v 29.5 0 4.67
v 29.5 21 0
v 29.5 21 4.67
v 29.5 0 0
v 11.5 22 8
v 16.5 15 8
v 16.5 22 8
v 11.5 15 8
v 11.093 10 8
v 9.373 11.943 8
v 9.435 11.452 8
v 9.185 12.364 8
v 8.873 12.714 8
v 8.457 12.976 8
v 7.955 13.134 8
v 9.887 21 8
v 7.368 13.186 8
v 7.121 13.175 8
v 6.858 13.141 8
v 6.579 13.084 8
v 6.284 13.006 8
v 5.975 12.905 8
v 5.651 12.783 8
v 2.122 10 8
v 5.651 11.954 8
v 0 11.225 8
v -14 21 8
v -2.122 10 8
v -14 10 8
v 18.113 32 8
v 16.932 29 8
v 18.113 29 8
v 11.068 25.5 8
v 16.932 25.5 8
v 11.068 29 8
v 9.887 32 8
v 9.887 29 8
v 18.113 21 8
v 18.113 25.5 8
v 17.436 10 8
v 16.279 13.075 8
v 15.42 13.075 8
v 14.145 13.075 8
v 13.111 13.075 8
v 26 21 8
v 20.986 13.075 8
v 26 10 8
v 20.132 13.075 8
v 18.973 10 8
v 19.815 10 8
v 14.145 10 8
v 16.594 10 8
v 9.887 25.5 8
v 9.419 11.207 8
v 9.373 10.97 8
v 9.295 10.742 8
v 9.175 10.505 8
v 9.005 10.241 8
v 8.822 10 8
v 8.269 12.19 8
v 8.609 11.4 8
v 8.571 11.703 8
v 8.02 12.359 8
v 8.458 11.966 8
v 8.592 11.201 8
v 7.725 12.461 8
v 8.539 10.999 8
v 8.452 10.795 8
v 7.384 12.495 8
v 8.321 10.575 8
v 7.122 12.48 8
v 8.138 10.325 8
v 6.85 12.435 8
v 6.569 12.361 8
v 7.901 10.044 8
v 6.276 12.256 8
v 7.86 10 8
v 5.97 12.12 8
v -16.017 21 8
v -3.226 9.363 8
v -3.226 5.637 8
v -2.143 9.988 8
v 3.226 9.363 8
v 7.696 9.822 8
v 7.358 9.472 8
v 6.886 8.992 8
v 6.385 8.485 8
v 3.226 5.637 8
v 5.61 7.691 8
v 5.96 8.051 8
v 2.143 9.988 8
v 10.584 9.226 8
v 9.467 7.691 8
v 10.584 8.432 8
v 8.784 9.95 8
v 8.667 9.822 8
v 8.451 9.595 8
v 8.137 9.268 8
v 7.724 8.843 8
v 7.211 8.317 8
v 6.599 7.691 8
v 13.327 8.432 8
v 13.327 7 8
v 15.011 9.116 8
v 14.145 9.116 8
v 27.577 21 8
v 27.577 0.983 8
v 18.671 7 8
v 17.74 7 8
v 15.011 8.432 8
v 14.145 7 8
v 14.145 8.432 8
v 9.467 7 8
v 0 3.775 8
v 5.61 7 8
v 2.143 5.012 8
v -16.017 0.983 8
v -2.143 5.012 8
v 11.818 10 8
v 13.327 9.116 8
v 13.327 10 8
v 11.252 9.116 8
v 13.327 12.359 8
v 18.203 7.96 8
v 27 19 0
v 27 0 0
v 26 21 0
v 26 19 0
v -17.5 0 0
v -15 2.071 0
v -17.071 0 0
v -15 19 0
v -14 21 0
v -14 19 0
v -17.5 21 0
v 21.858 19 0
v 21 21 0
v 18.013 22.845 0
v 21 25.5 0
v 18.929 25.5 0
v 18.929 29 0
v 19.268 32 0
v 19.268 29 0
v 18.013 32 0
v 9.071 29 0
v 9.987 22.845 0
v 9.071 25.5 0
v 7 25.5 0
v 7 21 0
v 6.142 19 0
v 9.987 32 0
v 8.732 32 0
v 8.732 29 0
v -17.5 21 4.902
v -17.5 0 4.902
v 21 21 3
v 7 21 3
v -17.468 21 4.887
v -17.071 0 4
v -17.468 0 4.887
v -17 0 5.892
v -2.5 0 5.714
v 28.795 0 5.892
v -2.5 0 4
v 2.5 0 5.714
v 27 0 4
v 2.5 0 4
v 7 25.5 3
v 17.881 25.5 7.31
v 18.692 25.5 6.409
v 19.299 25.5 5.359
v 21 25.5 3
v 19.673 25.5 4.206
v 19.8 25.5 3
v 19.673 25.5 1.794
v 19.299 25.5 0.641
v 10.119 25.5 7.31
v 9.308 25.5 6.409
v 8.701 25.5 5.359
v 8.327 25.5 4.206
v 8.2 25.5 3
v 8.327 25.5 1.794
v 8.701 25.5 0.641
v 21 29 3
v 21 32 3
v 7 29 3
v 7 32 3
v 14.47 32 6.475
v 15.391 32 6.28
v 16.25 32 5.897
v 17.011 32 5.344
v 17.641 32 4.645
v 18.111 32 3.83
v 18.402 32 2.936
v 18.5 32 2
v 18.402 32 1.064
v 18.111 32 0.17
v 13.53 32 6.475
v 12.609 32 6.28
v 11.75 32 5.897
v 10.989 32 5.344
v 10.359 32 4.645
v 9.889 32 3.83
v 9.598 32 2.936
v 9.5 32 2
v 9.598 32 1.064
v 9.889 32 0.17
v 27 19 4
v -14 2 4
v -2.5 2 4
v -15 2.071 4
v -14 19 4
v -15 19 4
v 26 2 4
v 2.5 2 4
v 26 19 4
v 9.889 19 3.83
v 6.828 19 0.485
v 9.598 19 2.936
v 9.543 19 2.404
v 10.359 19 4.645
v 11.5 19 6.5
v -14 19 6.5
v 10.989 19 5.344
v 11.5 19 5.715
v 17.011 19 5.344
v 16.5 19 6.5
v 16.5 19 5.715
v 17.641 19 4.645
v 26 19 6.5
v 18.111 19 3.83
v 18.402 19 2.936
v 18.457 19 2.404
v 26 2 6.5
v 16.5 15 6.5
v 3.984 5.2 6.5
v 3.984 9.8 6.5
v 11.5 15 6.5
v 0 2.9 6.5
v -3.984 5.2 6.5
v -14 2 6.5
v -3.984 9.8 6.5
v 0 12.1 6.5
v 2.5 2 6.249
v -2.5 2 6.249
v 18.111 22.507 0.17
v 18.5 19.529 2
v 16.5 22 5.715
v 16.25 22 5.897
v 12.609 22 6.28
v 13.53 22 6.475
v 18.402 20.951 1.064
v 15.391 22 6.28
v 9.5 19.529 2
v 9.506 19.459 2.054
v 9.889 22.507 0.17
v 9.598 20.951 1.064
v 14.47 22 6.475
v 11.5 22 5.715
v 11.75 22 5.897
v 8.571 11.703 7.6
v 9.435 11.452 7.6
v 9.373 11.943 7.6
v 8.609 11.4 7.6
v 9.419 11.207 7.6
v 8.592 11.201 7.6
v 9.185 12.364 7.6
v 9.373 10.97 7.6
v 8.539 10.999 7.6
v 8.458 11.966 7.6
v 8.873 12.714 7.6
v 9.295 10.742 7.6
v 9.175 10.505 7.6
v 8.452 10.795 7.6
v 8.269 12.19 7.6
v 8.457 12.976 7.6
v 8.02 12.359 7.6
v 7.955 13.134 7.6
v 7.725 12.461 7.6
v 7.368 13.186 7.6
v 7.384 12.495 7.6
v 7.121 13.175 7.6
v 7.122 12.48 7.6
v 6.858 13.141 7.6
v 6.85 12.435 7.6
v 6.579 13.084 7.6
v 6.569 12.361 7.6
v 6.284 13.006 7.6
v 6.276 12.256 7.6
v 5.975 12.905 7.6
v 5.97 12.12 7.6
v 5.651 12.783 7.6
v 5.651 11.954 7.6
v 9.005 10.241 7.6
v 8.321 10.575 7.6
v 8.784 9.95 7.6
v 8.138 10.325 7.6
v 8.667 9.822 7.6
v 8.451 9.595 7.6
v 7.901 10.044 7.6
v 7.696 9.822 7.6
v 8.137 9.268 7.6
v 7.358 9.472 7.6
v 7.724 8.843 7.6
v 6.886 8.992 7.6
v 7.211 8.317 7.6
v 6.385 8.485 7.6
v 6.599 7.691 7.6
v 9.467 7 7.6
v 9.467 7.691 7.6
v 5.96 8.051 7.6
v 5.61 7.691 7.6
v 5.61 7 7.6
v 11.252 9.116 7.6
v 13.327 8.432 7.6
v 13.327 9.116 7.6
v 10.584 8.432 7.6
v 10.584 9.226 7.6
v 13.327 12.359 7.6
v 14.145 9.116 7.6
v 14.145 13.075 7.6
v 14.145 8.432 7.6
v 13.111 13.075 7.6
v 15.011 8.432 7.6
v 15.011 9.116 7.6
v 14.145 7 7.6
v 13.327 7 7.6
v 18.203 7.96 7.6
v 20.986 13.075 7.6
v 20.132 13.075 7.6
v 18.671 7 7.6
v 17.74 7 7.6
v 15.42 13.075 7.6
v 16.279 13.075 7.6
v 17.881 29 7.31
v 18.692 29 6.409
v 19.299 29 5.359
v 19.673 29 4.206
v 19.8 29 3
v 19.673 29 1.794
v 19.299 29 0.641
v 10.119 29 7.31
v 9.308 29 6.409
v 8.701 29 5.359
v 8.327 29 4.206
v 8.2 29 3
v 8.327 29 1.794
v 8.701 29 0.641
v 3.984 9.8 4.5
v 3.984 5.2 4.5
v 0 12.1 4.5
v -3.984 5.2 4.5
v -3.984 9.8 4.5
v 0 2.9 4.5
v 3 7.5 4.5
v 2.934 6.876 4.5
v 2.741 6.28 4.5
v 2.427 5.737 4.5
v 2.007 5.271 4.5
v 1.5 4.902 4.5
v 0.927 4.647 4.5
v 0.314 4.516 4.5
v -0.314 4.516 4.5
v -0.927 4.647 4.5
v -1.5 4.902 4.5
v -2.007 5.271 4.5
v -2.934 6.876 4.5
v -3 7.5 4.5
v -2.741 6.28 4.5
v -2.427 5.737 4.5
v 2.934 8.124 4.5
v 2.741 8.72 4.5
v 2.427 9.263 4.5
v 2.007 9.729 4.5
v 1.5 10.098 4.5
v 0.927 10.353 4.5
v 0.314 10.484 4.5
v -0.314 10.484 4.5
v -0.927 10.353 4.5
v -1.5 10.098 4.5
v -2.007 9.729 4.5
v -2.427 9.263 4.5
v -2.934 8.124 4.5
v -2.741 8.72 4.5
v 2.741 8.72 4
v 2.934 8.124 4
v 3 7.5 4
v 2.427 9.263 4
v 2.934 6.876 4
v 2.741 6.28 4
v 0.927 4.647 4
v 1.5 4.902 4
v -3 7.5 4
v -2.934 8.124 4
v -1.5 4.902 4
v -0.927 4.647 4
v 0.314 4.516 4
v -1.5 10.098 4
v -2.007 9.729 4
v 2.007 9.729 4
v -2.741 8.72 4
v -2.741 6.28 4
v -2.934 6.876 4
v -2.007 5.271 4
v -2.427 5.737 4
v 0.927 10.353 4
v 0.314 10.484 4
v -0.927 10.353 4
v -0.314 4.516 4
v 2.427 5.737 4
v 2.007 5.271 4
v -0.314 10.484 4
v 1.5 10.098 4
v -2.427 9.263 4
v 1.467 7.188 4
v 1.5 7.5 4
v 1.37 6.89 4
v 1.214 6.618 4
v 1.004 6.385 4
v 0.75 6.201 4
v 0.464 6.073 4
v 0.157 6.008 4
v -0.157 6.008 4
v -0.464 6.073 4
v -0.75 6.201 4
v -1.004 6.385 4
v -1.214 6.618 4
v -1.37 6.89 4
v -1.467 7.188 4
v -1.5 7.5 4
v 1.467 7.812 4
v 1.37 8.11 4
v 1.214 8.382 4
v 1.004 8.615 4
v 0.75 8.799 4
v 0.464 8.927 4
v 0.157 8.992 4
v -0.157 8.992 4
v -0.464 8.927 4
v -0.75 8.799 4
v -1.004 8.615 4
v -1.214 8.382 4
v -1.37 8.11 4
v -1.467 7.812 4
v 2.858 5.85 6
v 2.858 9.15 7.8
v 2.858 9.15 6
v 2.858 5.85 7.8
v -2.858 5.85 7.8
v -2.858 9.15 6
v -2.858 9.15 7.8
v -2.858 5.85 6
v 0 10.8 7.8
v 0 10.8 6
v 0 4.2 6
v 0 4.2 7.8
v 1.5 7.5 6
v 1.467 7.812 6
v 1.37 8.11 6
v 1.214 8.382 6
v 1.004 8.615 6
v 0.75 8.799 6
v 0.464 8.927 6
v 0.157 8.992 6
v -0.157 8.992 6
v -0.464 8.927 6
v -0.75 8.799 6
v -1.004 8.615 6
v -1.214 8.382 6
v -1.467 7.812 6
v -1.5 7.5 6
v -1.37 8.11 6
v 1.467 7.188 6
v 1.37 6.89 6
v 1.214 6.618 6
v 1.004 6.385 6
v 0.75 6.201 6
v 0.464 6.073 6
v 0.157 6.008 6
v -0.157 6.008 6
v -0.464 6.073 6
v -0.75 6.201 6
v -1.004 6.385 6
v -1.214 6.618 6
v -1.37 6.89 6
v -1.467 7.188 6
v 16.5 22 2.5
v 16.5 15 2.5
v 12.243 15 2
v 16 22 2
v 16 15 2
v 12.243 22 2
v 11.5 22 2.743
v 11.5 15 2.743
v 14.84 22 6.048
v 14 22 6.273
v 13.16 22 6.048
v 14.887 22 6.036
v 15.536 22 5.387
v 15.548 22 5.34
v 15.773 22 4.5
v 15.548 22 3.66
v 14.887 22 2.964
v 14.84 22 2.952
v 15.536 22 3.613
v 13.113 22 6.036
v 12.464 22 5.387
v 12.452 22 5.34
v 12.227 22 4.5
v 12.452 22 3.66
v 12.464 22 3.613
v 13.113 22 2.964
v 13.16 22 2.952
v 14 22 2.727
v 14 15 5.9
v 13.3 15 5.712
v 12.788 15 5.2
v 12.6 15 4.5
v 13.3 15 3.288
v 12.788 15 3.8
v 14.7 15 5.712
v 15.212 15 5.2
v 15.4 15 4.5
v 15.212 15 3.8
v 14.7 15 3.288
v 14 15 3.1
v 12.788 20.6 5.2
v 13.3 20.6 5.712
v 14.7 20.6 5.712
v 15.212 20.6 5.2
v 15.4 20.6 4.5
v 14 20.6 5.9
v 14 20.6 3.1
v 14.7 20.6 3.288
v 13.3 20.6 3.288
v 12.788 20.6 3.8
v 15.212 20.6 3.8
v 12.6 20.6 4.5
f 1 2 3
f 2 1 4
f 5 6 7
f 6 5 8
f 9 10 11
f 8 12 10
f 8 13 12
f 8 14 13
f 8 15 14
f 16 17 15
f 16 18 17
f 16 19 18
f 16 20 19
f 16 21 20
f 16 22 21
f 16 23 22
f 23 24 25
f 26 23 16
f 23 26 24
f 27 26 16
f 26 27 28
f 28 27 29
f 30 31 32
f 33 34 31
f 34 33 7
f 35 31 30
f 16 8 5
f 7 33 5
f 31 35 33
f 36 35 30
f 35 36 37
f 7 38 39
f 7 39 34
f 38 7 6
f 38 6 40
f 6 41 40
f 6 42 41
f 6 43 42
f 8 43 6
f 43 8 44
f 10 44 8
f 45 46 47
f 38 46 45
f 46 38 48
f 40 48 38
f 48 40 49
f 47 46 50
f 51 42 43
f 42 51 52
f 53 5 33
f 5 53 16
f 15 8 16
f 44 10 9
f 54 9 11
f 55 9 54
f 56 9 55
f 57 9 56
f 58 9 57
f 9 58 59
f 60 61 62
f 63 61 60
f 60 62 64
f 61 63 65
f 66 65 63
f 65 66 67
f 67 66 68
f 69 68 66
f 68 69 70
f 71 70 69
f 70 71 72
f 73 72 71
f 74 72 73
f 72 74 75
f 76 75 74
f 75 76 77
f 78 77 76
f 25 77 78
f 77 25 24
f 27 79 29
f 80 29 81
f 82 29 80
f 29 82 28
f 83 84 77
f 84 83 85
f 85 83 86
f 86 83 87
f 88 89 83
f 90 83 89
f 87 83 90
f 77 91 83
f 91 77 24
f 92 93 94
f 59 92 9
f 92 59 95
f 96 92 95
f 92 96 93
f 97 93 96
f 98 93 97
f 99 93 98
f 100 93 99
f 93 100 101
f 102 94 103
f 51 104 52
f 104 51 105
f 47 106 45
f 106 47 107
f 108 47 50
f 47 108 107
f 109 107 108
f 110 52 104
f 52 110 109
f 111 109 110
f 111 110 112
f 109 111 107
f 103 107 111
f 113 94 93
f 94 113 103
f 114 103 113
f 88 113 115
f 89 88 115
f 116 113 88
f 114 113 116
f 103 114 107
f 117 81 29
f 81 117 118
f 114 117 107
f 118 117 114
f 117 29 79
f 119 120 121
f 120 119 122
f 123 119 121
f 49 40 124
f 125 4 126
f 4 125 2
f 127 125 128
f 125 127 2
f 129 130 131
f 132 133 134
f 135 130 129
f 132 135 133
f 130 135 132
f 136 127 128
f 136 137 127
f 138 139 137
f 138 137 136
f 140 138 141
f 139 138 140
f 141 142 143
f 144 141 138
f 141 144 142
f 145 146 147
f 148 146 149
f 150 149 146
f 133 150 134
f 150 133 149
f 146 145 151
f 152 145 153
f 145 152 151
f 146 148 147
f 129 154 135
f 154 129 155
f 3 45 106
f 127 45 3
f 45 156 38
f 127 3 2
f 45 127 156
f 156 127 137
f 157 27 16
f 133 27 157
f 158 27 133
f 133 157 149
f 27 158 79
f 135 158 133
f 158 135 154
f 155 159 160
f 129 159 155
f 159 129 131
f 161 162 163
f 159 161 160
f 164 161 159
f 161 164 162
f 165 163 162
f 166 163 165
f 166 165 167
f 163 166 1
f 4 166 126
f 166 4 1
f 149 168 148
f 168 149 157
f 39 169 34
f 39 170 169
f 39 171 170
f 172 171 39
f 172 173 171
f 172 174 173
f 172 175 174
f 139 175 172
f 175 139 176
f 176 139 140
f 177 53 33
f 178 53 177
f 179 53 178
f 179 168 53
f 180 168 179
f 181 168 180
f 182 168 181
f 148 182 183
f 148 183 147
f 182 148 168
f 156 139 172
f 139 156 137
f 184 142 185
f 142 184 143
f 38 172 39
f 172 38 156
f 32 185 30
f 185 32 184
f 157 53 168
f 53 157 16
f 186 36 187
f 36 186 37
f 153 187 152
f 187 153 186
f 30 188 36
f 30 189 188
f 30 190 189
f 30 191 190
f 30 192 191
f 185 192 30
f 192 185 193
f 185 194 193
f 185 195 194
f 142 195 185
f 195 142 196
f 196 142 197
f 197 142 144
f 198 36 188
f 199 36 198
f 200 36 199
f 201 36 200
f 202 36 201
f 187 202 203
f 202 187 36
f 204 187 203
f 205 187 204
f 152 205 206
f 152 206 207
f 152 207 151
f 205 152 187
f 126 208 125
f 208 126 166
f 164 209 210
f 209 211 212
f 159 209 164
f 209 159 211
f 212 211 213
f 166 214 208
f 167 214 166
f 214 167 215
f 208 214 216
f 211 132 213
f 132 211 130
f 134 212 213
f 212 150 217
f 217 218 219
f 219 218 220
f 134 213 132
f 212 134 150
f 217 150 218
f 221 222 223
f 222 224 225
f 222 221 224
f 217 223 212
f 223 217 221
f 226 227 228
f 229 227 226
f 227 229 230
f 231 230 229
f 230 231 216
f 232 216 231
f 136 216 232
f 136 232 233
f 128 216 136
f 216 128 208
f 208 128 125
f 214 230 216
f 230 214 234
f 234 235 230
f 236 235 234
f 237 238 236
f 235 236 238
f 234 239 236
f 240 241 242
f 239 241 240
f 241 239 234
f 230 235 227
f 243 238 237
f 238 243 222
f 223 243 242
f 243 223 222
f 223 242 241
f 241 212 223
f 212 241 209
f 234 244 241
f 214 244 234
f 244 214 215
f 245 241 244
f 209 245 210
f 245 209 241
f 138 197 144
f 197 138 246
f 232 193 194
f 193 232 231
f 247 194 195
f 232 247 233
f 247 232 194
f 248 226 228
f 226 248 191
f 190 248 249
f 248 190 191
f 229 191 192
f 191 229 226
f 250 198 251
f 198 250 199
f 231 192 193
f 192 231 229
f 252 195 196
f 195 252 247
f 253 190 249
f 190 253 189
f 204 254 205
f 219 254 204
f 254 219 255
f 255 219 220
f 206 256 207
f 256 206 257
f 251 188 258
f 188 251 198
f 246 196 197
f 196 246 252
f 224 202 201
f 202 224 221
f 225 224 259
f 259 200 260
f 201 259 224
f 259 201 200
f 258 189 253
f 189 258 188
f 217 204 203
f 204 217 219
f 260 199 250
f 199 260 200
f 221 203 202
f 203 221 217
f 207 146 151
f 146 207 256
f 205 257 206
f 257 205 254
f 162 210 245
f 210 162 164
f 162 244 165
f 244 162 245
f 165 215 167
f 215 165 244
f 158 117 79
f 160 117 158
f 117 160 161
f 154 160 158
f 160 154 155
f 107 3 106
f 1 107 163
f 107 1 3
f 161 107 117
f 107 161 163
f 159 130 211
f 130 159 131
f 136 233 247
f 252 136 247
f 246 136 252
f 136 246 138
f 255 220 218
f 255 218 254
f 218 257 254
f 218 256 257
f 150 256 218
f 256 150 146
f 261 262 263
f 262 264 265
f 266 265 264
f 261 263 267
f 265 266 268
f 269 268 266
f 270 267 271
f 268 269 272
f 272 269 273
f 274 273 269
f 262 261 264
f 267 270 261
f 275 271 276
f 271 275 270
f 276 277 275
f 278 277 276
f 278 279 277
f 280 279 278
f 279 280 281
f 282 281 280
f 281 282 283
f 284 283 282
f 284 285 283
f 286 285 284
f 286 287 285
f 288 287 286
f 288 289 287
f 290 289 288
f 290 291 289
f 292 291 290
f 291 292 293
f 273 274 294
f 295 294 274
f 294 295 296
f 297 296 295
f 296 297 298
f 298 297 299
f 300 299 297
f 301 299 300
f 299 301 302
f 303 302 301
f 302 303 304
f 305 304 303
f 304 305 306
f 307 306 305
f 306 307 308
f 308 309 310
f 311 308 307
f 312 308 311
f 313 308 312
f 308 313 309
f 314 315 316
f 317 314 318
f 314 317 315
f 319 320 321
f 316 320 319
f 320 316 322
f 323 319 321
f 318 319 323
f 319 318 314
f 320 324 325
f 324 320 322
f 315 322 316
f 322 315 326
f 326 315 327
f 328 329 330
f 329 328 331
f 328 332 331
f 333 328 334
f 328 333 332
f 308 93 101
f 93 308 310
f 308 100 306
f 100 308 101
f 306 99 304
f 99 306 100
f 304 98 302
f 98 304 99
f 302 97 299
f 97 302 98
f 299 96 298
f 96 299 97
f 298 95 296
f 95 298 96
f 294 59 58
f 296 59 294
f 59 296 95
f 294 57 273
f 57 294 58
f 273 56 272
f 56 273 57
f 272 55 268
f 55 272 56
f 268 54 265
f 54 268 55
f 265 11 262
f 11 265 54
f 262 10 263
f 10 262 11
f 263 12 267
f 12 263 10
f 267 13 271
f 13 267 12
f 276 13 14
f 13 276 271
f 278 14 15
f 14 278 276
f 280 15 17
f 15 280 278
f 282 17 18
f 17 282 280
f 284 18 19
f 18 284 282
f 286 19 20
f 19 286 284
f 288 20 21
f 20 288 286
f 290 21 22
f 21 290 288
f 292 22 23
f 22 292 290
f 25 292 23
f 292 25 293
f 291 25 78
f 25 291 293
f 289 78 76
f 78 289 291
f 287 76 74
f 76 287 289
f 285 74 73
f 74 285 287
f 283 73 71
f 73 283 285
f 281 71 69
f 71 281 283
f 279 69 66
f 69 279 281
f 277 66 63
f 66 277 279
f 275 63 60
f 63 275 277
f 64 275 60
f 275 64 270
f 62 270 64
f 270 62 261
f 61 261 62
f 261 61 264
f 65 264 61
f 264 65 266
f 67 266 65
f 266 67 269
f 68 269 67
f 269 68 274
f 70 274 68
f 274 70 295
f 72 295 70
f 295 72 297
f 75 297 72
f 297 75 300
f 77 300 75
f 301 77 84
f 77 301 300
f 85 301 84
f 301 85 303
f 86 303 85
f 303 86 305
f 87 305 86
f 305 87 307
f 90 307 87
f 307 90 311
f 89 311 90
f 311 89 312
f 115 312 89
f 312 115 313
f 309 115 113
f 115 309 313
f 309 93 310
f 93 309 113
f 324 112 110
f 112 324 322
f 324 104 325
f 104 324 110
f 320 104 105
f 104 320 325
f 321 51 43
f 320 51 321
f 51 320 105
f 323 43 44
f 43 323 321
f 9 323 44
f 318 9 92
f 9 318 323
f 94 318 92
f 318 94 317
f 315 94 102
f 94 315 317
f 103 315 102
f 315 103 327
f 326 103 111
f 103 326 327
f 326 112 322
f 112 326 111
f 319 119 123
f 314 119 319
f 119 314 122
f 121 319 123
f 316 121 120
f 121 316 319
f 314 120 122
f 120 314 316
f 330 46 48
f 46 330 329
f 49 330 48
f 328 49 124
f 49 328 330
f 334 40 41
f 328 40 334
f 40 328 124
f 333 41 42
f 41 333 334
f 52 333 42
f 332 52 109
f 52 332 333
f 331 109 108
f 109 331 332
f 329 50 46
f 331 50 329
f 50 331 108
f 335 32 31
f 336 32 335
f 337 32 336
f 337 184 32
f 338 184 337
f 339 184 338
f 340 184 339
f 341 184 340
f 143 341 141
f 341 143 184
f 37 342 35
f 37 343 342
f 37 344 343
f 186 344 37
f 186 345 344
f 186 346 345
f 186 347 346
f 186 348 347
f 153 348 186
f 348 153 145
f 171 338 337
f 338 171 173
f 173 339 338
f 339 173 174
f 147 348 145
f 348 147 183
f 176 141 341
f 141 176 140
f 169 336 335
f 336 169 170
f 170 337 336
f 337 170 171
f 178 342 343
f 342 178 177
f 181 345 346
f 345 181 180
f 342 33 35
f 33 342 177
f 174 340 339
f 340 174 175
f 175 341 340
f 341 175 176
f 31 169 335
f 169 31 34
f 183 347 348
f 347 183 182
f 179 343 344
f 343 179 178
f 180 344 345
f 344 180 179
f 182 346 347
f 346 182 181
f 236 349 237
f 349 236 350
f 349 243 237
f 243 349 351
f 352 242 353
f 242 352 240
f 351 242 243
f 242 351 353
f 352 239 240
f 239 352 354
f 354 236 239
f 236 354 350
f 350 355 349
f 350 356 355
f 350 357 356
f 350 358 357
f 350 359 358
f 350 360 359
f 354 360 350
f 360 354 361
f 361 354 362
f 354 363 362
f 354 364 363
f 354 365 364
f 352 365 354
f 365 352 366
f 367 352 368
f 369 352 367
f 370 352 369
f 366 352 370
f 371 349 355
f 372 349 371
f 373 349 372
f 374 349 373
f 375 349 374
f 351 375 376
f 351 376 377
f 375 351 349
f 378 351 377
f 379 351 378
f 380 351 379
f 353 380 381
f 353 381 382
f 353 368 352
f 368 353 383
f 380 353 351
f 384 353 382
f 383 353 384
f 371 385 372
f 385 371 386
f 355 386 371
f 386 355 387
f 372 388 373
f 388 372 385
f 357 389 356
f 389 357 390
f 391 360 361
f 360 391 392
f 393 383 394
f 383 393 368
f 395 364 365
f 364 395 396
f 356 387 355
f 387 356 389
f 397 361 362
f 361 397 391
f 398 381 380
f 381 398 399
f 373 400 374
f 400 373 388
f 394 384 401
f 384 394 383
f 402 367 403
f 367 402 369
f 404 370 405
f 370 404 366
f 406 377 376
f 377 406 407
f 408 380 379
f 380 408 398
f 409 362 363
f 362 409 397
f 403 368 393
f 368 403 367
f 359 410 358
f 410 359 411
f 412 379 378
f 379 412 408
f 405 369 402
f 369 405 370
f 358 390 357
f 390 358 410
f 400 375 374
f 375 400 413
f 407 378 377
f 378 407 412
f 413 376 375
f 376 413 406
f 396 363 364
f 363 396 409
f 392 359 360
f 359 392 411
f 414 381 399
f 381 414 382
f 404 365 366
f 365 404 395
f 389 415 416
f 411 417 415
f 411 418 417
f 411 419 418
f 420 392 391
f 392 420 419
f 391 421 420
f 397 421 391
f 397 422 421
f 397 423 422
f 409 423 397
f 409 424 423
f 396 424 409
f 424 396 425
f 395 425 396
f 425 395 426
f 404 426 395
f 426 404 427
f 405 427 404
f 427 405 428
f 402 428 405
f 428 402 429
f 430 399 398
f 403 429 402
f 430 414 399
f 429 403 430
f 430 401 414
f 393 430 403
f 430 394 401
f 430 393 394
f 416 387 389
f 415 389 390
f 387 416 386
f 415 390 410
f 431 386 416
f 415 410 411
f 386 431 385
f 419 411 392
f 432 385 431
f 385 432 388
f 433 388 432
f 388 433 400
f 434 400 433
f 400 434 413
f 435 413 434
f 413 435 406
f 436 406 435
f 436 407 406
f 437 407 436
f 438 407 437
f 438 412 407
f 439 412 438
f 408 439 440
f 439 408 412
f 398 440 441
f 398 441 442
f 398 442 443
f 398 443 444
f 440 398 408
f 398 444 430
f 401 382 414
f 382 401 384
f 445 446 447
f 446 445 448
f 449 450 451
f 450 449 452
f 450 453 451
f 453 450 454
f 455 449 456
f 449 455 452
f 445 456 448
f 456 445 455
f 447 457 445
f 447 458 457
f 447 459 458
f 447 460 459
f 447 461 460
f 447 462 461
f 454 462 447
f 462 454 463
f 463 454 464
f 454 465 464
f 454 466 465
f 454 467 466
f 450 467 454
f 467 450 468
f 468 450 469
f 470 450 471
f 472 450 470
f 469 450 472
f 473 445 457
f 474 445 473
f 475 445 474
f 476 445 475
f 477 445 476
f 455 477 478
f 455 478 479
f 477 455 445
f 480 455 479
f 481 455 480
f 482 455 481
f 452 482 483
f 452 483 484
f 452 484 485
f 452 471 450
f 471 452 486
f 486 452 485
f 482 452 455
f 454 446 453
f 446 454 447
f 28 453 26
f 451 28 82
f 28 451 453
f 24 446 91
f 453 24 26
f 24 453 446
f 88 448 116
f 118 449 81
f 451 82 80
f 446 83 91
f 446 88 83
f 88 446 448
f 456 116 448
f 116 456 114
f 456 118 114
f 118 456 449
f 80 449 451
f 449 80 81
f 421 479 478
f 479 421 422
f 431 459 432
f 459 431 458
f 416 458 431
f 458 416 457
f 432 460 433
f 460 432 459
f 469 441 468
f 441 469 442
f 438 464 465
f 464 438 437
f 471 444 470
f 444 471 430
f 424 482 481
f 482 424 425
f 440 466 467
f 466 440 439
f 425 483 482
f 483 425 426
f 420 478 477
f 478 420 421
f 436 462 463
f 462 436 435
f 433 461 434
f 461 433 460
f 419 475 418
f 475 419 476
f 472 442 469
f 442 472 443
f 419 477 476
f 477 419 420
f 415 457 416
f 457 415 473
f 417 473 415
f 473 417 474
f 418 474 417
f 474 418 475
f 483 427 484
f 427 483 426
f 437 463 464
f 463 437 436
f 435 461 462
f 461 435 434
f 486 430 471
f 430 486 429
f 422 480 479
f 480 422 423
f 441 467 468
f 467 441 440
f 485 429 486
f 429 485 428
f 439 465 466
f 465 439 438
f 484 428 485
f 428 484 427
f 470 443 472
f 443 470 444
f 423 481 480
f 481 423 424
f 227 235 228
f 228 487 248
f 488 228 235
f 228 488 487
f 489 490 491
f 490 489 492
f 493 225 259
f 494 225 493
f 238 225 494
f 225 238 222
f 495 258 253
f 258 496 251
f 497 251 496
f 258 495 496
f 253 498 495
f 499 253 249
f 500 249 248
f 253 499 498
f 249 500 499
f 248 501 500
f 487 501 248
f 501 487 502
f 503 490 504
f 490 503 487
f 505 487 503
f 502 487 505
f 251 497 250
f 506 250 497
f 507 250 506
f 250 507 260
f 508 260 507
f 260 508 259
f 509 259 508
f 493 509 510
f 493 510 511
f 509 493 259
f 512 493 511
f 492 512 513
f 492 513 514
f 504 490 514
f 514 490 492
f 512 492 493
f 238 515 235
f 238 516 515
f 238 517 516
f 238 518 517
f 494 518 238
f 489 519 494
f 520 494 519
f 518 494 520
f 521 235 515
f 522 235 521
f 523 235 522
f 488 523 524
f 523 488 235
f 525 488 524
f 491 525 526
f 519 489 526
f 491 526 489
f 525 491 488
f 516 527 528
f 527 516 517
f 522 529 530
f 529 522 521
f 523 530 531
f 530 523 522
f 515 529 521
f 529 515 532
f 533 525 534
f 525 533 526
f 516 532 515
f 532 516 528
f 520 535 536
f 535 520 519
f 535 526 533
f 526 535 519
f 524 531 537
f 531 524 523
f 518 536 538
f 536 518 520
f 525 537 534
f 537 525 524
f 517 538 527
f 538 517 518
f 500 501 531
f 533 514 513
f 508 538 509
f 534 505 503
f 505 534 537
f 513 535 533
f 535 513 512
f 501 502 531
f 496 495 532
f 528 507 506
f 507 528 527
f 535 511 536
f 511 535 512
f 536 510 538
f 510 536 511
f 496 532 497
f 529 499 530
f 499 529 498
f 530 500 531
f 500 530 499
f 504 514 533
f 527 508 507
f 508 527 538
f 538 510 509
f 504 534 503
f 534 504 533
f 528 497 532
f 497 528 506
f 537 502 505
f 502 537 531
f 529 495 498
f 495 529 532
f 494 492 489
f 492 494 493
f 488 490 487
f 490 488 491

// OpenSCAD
module cover()
{
    translate([ -17.5, 0, 0 ]) cube([ 47, 21, 8 ]);  // cover
    translate([ -7+14, 19, 0 ]) cube([ 3, 6.5, 3 ]);  // tube reinforcement
    translate([ 4+14, 19, 0 ]) cube([ 3, 6.5, 3 ]);  // tube reinforcement
    translate( [ 14 , 32 , 3 ] ) rotate( [90,0,0] ) cylinder( h = 12, r = 7, $fn=6);  // cable tube outer
}

module inside_cut(){
    translate([ -15, -1, -1 ]) cube( [42,20,5] );     // inside cut
    translate([ -14, 2, 4 ])  cube( [40,17,2.5 ] );     // inside cut
    
    translate( [ 14 , 32 , 2 ] ) rotate( [90,0,0] ) cylinder( h = 16, r = 4.5, $fn=30);  // cable tube inner
    
    translate([ -14, 10, -5 ])  cube( [40,25,5 ] );     // inside cut
    translate([ -14, 10, 8 ])  cube( [40,25,3 ] );     // inside cut
    
    translate([ -2.5, -6, 1 ])  rotate([15,0,0]) cube( [5,10,3 ] );     // LED
    
    translate([ -22, -5, 7 ]) rotate([0,25,0])  cube( [5,40,6 ] );     // corners
    translate([ 27, -5, 9 ]) rotate([0,60,0])  cube( [6,40,5 ] );     // corners
    translate([ 30, -5, 7 ]) rotate([0,25,90])  cube( [5,50,5 ] );     // corners
    
    translate([ 15, -5, -1 ]) rotate([0,0,45])  cube( [5,5,5 ] );     // corners
    translate([ -15, -5, -1 ]) rotate([0,0,45])  cube( [5,5,5 ] );     // corners
    
    
    translate([ 8+14, 13, -10]) rotate([0,-45,45])  cube( [10,10,10 ] );     // corners
    translate([ -8+14, 13, -10]) rotate([0,-45,-45])  cube( [10,10,10 ] );     // corners

    translate([5,7,7.6])linear_extrude(height = 0.4) {
       text("24V",size=6, center=true,font="Arial Black");
     }
    }

    module ziptie(){
        difference(){
        translate( [ 14 , 29 , 3 ] ) rotate( [90,0,0] ) cylinder( h = 3.5, r = 10, $fn=30);  // cable tube outer
        translate( [ 14 , 29 , 3 ] ) rotate( [90,0,0] ) cylinder( h = 3.5, r = 5.8, $fn=30);  // cable tube outer
        }
        }

    module filament_holder(){
        difference(){
        translate([ -2.5+14,15, 2 ]) rotate([0,0,0])  cube( [5,7,6 ] );     // body
        translate( [ 14 , 24 , 4.5 ] ) rotate( [90,0,0] ) cylinder( h = 10, r = 1.4, $fn=12);  // filament
        translate( [ 14 , 22.1 , 4.5 ] ) rotate( [90,0,0] ) cylinder( h = 1.5, r1 = 1.8, r2=1.4, $fn=12);  // filament

        translate([ -5+14,15, 1 ]) rotate([0,45,0])  cube( [3,15,3 ] );     // corners            
        translate([ 1+14,15, 1 ]) rotate([0,45,0])  cube( [3,15,3 ] );     // corners
        }
    }
    module m3_screw(){
        
    translate( [ 0 , 7.5 , 6 ] ) rotate( [0,0,90] ) cylinder( h = 2.5, r = 3.3, $fn=6);  // M3 HEAD
    translate( [ 0 , 7.5 , 7.8] ) rotate( [0,0,90] ) cylinder( h = 0.8, r1 = 3.3, r2=5, $fn=6);  // M3 HEAD
    translate( [ 0 , 7.5 , -10 ] ) rotate( [0,0,0] ) cylinder( h = 20, r = 1.5, $fn=30);  // M3 thread
    }
    
    module nut_trap(){
    translate( [ 0 , 7.5 , 4.5 ] ) rotate( [0,0,90] ) cylinder( h = 2.5, r = 4.6, $fn=6);  // M3 HEAD
    translate( [ 0 , 7.5 , 4 ] ) rotate( [0,0,0] ) cylinder( h = 1, r = 3, $fn=30);      
    }
    
    difference(){
    union(){
        difference(){
        cover();
        inside_cut();
            ziptie();
        }
        nut_trap();
    }   
    m3_screw();
    }
    
    filament_holder();
    
